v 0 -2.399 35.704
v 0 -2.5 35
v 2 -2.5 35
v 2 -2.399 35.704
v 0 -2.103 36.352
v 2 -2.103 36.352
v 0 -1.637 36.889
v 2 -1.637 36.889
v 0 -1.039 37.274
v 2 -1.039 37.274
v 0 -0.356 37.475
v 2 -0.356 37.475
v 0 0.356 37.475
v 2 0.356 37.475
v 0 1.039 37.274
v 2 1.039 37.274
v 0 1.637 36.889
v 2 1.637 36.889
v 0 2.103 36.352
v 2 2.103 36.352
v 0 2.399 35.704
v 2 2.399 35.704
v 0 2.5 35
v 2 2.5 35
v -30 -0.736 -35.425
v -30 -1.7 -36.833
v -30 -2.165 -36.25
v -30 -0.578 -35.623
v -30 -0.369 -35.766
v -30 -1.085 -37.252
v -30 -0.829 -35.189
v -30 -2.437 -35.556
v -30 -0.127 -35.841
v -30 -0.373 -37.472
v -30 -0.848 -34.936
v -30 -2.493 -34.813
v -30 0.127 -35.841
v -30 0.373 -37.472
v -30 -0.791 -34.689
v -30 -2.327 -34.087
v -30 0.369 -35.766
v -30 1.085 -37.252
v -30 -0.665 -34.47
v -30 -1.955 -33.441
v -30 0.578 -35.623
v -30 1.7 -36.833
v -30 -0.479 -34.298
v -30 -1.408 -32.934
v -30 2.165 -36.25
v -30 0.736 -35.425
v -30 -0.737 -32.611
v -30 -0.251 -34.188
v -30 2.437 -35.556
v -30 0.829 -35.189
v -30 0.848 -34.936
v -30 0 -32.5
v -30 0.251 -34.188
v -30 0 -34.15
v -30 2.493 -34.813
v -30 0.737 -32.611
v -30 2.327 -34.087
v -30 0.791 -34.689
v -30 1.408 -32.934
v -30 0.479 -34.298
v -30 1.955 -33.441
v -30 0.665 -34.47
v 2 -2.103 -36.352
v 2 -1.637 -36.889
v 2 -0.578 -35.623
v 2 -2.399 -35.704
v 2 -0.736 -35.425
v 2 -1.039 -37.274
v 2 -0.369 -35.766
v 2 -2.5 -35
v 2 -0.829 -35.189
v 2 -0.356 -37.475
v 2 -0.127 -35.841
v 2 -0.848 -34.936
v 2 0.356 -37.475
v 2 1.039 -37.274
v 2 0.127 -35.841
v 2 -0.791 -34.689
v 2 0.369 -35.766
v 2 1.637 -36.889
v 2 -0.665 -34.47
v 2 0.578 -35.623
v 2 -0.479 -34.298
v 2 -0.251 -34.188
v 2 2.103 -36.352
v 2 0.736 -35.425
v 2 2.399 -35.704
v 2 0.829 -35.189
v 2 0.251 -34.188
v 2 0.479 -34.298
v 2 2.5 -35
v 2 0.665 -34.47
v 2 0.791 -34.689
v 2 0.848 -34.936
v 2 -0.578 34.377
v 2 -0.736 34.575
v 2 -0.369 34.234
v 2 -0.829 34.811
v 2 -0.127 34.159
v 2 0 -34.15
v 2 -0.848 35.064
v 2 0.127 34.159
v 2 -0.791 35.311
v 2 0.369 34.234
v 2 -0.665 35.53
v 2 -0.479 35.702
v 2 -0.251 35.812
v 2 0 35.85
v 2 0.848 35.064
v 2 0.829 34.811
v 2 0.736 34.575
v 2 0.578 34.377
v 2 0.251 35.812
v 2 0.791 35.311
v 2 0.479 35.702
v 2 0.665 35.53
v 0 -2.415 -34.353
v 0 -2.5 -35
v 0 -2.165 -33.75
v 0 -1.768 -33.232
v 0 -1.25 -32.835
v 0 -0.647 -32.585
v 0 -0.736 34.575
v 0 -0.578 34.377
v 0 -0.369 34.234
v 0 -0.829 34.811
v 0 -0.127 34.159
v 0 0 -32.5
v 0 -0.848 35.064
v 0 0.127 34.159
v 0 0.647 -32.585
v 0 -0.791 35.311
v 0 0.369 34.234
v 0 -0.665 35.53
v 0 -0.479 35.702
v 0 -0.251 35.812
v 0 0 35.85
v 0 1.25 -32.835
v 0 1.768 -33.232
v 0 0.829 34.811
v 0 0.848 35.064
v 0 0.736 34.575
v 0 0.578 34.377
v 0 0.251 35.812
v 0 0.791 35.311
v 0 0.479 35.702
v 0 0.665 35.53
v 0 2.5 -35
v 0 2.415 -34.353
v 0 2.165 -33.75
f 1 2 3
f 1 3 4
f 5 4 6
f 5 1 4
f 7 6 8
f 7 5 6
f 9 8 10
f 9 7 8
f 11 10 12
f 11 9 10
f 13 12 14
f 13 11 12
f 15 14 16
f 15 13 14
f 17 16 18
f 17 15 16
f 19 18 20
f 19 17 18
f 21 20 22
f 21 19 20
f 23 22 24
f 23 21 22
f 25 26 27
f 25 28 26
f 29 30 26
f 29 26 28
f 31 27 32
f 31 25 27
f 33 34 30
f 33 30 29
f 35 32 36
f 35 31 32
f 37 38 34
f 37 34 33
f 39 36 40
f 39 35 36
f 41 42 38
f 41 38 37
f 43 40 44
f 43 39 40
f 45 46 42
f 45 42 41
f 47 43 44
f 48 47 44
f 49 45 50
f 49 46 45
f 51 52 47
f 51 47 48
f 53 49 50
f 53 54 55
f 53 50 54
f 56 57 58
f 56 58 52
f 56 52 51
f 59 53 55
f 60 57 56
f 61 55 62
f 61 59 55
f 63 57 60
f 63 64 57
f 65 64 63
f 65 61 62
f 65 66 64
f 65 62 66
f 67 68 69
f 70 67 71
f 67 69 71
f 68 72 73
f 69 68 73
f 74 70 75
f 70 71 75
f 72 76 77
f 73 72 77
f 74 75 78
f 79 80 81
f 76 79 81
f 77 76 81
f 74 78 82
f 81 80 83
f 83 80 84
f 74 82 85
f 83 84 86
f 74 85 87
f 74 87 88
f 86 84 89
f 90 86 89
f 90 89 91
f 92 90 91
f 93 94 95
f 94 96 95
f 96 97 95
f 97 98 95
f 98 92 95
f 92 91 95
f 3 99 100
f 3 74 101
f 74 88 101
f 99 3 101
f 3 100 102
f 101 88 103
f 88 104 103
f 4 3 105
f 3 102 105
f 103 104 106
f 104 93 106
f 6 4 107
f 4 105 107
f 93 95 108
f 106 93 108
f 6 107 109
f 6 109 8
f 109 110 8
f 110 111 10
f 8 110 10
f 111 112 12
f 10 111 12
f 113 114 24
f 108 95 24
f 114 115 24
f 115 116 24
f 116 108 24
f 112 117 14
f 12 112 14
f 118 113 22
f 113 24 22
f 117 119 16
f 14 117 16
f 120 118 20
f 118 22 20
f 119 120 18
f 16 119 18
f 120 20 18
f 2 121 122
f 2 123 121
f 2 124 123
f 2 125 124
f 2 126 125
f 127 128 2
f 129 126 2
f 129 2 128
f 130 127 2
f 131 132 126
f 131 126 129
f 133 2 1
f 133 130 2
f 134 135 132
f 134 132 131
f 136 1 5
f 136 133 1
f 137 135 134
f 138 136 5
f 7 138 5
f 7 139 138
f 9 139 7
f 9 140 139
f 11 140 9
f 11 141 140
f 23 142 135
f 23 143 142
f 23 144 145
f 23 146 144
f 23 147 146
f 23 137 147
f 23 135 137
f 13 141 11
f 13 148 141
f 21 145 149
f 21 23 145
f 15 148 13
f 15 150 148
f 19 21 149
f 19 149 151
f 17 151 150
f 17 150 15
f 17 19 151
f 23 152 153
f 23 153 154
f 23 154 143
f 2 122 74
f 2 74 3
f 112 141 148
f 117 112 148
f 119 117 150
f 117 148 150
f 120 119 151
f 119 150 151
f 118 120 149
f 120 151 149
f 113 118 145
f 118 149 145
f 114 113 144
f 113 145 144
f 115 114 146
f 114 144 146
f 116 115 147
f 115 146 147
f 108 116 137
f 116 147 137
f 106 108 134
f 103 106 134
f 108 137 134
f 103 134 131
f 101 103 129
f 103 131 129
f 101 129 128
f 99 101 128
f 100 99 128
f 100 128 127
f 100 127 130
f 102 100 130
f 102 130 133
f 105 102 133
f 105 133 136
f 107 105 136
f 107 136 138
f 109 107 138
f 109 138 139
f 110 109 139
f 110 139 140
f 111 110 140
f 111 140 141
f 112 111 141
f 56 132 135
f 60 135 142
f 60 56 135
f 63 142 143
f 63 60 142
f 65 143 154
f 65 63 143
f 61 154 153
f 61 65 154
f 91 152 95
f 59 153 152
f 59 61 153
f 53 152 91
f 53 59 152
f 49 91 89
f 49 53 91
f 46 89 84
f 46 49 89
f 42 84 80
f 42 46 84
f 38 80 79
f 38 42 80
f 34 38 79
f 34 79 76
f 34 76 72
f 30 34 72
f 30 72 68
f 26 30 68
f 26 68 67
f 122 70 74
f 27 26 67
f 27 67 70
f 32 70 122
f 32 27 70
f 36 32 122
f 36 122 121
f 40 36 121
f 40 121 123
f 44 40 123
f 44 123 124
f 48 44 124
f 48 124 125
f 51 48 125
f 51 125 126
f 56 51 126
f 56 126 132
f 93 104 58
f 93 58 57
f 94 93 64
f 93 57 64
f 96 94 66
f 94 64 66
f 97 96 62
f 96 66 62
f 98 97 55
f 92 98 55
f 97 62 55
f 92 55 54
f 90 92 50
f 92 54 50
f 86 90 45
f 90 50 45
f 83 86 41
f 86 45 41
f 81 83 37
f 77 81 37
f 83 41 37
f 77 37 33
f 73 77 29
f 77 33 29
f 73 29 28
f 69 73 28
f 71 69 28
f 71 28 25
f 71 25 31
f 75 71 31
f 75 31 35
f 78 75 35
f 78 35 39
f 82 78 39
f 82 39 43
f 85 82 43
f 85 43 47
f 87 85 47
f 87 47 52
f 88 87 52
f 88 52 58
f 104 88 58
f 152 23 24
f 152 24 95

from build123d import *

# Parameters (mm, degrees)
RESSALTO_EXTRUS_O1_DEPTH = 2
RESSALTO_EXTRUS_O2_START = 30
ESBO_O2_R                = 2.5
RESSALTO_EXTRUS_O2_DEPTH = 30
CORTE_EXTRUS_O1_REACH    = 51.361
ESBO_O3_R                = 0.85
CORTE_EXTRUS_O2_REACH    = 50.088
ESBO_O4_R                = 0.85


with BuildPart() as part:
    # Esboço1 → Ressalto-extrusão1 (new body)
    with BuildSketch(Plane(origin=(0, 0, 0), x_dir=(0, 0, -1), z_dir=(1, 0, 0))):
        with BuildLine():
            Line((-35, 2.5), (35, 2.5))
            ThreePointArc((35, 2.5), (37.5, 0), (35, -2.5))
            Line((35, -2.5), (-35, -2.5))
            ThreePointArc((-35, -2.5), (-37.5, 0), (-35, 2.5))
        make_face()
    extrude(amount=RESSALTO_EXTRUS_O1_DEPTH)

    # Esboço2 → Ressalto-extrusão2 (add)
    with BuildSketch(Plane.ZY.offset(RESSALTO_EXTRUS_O2_START)):
        with Locations((-35, 0)):
            Circle(ESBO_O2_R)
    extrude(amount=-RESSALTO_EXTRUS_O2_DEPTH)

    # Esboço3 → Corte-extrusão1 (cut, up to next)
    with BuildSketch(Plane.ZY.offset(30), mode=Mode.PRIVATE) as corte_extrus_o1_sk1:
        with Locations((-35, 0)):
            Circle(ESBO_O3_R)
    corte_extrus_o1_tool1 = extrude(corte_extrus_o1_sk1.sketch, amount=-CORTE_EXTRUS_O1_REACH, mode=Mode.PRIVATE) & part.part
    add(corte_extrus_o1_tool1.solids().sort_by_distance((-30, 0, -35))[0], mode=Mode.SUBTRACT)

    # Esboço4 → Corte-extrusão2 (cut, up to next)
    with BuildSketch(Plane.ZY, mode=Mode.PRIVATE) as corte_extrus_o2_sk1:
        with Locations((35, 0)):
            Circle(ESBO_O4_R)
    corte_extrus_o2_tool1 = extrude(corte_extrus_o2_sk1.sketch, amount=-CORTE_EXTRUS_O2_REACH, mode=Mode.PRIVATE) & part.part
    add(corte_extrus_o2_tool1.solids().sort_by_distance((0, 0, 35))[0], mode=Mode.SUBTRACT)


solid = part.part
